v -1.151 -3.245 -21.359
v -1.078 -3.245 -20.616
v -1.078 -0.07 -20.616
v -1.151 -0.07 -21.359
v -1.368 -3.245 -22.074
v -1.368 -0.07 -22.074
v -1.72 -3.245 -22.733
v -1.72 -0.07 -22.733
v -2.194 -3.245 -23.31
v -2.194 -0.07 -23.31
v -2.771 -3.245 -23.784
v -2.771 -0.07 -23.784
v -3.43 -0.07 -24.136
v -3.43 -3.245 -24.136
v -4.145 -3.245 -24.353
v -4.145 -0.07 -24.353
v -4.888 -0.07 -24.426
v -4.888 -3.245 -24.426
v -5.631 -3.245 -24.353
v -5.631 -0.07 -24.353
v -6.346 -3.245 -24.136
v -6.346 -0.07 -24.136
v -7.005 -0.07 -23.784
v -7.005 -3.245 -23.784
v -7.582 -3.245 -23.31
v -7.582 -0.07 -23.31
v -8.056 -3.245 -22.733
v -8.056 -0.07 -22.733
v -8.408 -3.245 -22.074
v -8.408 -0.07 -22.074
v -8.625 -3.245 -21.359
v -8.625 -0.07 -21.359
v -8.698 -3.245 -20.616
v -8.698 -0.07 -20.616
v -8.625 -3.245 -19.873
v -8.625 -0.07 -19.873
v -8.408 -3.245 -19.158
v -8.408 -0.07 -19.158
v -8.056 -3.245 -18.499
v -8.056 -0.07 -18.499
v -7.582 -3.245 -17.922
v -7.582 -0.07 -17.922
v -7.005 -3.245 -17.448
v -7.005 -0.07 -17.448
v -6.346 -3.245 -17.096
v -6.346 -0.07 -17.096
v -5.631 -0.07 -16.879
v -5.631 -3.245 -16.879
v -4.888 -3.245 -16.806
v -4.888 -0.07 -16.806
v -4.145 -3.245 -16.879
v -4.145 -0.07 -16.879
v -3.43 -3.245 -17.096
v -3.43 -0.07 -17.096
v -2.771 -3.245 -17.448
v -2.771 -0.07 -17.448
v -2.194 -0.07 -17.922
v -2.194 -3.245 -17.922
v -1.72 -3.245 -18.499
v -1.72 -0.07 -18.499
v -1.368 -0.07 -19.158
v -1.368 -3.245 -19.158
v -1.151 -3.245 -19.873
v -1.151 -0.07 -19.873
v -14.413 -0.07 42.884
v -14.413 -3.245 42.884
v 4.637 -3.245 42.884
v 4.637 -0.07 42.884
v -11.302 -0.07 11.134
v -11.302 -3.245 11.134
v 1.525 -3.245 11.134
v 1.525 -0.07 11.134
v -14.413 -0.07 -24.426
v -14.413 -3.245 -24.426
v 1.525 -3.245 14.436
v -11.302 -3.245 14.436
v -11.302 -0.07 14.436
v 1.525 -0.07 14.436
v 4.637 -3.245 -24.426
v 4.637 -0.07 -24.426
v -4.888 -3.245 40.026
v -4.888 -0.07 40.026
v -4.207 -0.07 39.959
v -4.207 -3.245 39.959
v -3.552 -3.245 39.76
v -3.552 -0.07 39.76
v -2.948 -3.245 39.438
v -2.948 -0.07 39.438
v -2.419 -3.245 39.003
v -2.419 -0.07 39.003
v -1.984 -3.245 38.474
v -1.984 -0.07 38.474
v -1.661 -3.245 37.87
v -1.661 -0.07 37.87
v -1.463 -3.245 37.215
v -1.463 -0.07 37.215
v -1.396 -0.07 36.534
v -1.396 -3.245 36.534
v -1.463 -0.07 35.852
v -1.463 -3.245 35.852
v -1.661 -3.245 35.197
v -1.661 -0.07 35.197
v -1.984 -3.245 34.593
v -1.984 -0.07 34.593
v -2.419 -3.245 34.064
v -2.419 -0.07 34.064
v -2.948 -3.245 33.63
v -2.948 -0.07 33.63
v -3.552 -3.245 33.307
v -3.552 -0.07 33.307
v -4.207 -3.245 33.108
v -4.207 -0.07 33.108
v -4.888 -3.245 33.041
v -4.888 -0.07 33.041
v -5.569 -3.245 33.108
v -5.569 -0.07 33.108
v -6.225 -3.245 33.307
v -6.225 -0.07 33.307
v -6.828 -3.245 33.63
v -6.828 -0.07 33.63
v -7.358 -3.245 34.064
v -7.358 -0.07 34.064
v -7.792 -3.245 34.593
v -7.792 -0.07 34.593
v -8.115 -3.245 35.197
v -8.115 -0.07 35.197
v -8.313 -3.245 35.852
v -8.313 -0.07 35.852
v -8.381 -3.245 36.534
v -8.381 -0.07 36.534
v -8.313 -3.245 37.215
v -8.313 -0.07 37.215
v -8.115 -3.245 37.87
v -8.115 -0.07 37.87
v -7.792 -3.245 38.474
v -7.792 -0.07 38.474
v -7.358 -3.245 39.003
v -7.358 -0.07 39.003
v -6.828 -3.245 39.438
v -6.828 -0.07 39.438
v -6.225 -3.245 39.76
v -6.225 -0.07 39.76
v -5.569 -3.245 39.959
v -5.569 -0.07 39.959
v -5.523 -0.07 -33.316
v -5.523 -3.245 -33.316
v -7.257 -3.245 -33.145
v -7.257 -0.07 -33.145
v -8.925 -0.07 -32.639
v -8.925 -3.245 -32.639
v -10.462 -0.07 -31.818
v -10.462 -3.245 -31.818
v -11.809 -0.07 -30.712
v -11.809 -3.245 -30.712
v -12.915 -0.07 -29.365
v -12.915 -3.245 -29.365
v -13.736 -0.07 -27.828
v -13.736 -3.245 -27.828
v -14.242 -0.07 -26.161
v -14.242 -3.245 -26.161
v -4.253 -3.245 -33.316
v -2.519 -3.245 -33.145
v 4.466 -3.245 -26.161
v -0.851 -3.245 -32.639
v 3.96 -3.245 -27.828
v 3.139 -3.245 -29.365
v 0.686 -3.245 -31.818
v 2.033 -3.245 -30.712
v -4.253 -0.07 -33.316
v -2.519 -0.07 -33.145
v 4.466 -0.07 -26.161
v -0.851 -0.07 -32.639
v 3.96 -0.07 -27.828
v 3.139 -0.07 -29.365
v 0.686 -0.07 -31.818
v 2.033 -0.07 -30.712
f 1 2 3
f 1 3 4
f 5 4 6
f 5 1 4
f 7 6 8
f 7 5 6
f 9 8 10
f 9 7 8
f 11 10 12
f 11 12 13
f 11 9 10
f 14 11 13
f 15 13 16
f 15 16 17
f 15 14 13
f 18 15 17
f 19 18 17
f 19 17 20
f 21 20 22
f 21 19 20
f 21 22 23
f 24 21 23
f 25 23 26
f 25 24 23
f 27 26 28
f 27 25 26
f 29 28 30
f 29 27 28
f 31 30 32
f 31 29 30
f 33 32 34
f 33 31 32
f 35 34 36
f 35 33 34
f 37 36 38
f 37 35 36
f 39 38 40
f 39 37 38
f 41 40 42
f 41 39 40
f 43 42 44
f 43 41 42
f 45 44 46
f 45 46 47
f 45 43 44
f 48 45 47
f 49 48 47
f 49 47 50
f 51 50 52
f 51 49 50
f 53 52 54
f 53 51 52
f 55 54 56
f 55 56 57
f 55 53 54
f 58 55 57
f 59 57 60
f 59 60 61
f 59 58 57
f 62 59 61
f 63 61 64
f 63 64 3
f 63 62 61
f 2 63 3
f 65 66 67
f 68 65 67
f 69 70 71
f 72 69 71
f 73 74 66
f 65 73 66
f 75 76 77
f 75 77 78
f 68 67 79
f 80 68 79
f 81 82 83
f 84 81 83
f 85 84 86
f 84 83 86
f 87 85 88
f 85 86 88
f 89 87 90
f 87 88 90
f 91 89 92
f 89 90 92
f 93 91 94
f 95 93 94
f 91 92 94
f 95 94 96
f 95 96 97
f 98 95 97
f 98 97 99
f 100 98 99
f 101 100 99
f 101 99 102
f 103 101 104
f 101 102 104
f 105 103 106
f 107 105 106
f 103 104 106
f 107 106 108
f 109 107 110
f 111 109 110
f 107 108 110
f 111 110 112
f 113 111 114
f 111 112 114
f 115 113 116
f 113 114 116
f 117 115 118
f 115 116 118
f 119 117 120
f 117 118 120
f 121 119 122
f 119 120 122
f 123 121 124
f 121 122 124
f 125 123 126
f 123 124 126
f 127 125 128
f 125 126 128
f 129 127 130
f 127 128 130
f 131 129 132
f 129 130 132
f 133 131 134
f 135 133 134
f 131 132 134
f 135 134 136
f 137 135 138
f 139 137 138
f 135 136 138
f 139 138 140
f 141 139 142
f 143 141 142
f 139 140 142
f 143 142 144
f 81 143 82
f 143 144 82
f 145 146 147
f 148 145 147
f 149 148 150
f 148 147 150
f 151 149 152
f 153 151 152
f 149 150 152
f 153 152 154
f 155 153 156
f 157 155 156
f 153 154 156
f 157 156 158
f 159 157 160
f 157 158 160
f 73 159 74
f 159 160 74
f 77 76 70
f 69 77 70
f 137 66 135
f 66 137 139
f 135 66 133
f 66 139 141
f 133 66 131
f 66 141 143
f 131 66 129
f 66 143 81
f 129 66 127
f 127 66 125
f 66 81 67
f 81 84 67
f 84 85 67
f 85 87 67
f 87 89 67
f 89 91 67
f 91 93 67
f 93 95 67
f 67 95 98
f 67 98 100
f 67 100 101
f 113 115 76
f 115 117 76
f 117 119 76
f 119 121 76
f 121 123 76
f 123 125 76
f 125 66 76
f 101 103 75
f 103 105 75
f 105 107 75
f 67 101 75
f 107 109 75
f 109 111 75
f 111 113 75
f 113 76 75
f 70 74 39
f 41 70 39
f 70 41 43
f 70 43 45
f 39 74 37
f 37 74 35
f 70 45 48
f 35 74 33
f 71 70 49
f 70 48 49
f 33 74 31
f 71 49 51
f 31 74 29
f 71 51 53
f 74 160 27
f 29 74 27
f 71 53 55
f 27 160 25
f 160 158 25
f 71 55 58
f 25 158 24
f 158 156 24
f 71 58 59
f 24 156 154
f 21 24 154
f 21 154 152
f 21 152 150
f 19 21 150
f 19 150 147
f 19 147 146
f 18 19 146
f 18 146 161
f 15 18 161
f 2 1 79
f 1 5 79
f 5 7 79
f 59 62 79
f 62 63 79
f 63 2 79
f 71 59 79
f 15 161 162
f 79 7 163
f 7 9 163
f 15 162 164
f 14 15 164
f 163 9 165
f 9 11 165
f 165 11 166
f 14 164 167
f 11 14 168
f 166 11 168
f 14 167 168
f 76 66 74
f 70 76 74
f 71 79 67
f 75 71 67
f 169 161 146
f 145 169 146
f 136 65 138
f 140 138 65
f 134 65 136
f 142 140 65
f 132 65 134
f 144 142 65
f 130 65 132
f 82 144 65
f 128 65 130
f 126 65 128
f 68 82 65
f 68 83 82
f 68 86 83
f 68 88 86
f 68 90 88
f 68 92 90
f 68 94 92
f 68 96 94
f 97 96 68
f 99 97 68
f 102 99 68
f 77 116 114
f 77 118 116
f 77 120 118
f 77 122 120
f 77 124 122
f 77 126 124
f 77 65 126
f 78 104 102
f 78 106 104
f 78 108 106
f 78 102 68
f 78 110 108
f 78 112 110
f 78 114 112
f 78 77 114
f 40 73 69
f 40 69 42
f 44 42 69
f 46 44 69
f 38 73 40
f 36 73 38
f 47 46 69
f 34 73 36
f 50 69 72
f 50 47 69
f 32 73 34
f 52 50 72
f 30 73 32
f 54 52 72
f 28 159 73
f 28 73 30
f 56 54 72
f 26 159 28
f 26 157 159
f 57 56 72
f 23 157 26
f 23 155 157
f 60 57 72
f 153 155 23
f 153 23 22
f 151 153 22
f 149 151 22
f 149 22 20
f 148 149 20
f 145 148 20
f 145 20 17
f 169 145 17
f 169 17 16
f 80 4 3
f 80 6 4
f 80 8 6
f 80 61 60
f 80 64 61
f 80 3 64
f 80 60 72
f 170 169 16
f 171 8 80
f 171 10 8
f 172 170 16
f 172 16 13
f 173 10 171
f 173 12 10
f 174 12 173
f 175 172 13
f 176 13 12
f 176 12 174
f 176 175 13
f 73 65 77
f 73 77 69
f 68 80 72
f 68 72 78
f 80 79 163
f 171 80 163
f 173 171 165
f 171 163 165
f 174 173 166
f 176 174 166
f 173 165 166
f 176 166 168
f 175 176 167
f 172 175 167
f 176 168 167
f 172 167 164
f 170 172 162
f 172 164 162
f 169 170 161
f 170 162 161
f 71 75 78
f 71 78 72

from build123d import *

# Parameters (mm, degrees)
STEM_START                = -3.244746183
STEM_OTHER_SIDE_OUTLINE_W = 12.827
STEM_OTHER_SIDE_OUTLINE_H = 3.302
STEM_OTHER_SIDE_OUTLINE_R = 3.81
STEM_OTHER_SIDE_DEPTH     = 3.175
SKETCH1_R                 = 3.4925
CUT_EXTRUDE1_DEPTH        = 3.175


# Read off the part's stored shape, not the designer's step: Stem Other Side
with BuildPart() as part:
    # Stem Other Side outline → Stem Other Side (new body)
    with BuildSketch(Plane(origin=(0, 0, 0), x_dir=(1, 0, 0), z_dir=(0, 1, 0)).offset(STEM_START)):
        with BuildLine():
            Line((-4.25309824, 33.316184511), (-5.52309824, 33.316184511))
            ThreePointArc((-5.52309824, 33.316184511), (-11.809277525, 30.712363796), (-14.41309824, 24.426184511))
            Line((-14.41309824, 24.426184511), (-14.41309824, -42.883815489))
            Line((-14.41309824, -42.883815489), (4.63690176, -42.883815489))
            Line((4.63690176, -42.883815489), (4.63690176, 24.426184511))
            ThreePointArc((4.63690176, 24.426184511), (2.033081045, 30.712363796), (-4.25309824, 33.316184511))
        make_face()
        with Locations((-4.88809824, -12.784815489)):
            Rectangle(STEM_OTHER_SIDE_OUTLINE_W, STEM_OTHER_SIDE_OUTLINE_H, mode=Mode.SUBTRACT)
        with Locations((-4.88809824, 20.616184511)):
            Circle(STEM_OTHER_SIDE_OUTLINE_R, mode=Mode.SUBTRACT)
    extrude(amount=STEM_OTHER_SIDE_DEPTH)

    # Sketch1 → Cut-Extrude1 (cut)
    with BuildSketch(Plane(origin=(0, -0.069746183, 0), x_dir=(1, 0, 0), z_dir=(0, 1, 0))):
        with Locations(Location((-4.88809824, -36.533815489, 0), (0, 0, 270))):
            Circle(SKETCH1_R)
    extrude(amount=-CUT_EXTRUDE1_DEPTH, mode=Mode.SUBTRACT)


solid = part.part
